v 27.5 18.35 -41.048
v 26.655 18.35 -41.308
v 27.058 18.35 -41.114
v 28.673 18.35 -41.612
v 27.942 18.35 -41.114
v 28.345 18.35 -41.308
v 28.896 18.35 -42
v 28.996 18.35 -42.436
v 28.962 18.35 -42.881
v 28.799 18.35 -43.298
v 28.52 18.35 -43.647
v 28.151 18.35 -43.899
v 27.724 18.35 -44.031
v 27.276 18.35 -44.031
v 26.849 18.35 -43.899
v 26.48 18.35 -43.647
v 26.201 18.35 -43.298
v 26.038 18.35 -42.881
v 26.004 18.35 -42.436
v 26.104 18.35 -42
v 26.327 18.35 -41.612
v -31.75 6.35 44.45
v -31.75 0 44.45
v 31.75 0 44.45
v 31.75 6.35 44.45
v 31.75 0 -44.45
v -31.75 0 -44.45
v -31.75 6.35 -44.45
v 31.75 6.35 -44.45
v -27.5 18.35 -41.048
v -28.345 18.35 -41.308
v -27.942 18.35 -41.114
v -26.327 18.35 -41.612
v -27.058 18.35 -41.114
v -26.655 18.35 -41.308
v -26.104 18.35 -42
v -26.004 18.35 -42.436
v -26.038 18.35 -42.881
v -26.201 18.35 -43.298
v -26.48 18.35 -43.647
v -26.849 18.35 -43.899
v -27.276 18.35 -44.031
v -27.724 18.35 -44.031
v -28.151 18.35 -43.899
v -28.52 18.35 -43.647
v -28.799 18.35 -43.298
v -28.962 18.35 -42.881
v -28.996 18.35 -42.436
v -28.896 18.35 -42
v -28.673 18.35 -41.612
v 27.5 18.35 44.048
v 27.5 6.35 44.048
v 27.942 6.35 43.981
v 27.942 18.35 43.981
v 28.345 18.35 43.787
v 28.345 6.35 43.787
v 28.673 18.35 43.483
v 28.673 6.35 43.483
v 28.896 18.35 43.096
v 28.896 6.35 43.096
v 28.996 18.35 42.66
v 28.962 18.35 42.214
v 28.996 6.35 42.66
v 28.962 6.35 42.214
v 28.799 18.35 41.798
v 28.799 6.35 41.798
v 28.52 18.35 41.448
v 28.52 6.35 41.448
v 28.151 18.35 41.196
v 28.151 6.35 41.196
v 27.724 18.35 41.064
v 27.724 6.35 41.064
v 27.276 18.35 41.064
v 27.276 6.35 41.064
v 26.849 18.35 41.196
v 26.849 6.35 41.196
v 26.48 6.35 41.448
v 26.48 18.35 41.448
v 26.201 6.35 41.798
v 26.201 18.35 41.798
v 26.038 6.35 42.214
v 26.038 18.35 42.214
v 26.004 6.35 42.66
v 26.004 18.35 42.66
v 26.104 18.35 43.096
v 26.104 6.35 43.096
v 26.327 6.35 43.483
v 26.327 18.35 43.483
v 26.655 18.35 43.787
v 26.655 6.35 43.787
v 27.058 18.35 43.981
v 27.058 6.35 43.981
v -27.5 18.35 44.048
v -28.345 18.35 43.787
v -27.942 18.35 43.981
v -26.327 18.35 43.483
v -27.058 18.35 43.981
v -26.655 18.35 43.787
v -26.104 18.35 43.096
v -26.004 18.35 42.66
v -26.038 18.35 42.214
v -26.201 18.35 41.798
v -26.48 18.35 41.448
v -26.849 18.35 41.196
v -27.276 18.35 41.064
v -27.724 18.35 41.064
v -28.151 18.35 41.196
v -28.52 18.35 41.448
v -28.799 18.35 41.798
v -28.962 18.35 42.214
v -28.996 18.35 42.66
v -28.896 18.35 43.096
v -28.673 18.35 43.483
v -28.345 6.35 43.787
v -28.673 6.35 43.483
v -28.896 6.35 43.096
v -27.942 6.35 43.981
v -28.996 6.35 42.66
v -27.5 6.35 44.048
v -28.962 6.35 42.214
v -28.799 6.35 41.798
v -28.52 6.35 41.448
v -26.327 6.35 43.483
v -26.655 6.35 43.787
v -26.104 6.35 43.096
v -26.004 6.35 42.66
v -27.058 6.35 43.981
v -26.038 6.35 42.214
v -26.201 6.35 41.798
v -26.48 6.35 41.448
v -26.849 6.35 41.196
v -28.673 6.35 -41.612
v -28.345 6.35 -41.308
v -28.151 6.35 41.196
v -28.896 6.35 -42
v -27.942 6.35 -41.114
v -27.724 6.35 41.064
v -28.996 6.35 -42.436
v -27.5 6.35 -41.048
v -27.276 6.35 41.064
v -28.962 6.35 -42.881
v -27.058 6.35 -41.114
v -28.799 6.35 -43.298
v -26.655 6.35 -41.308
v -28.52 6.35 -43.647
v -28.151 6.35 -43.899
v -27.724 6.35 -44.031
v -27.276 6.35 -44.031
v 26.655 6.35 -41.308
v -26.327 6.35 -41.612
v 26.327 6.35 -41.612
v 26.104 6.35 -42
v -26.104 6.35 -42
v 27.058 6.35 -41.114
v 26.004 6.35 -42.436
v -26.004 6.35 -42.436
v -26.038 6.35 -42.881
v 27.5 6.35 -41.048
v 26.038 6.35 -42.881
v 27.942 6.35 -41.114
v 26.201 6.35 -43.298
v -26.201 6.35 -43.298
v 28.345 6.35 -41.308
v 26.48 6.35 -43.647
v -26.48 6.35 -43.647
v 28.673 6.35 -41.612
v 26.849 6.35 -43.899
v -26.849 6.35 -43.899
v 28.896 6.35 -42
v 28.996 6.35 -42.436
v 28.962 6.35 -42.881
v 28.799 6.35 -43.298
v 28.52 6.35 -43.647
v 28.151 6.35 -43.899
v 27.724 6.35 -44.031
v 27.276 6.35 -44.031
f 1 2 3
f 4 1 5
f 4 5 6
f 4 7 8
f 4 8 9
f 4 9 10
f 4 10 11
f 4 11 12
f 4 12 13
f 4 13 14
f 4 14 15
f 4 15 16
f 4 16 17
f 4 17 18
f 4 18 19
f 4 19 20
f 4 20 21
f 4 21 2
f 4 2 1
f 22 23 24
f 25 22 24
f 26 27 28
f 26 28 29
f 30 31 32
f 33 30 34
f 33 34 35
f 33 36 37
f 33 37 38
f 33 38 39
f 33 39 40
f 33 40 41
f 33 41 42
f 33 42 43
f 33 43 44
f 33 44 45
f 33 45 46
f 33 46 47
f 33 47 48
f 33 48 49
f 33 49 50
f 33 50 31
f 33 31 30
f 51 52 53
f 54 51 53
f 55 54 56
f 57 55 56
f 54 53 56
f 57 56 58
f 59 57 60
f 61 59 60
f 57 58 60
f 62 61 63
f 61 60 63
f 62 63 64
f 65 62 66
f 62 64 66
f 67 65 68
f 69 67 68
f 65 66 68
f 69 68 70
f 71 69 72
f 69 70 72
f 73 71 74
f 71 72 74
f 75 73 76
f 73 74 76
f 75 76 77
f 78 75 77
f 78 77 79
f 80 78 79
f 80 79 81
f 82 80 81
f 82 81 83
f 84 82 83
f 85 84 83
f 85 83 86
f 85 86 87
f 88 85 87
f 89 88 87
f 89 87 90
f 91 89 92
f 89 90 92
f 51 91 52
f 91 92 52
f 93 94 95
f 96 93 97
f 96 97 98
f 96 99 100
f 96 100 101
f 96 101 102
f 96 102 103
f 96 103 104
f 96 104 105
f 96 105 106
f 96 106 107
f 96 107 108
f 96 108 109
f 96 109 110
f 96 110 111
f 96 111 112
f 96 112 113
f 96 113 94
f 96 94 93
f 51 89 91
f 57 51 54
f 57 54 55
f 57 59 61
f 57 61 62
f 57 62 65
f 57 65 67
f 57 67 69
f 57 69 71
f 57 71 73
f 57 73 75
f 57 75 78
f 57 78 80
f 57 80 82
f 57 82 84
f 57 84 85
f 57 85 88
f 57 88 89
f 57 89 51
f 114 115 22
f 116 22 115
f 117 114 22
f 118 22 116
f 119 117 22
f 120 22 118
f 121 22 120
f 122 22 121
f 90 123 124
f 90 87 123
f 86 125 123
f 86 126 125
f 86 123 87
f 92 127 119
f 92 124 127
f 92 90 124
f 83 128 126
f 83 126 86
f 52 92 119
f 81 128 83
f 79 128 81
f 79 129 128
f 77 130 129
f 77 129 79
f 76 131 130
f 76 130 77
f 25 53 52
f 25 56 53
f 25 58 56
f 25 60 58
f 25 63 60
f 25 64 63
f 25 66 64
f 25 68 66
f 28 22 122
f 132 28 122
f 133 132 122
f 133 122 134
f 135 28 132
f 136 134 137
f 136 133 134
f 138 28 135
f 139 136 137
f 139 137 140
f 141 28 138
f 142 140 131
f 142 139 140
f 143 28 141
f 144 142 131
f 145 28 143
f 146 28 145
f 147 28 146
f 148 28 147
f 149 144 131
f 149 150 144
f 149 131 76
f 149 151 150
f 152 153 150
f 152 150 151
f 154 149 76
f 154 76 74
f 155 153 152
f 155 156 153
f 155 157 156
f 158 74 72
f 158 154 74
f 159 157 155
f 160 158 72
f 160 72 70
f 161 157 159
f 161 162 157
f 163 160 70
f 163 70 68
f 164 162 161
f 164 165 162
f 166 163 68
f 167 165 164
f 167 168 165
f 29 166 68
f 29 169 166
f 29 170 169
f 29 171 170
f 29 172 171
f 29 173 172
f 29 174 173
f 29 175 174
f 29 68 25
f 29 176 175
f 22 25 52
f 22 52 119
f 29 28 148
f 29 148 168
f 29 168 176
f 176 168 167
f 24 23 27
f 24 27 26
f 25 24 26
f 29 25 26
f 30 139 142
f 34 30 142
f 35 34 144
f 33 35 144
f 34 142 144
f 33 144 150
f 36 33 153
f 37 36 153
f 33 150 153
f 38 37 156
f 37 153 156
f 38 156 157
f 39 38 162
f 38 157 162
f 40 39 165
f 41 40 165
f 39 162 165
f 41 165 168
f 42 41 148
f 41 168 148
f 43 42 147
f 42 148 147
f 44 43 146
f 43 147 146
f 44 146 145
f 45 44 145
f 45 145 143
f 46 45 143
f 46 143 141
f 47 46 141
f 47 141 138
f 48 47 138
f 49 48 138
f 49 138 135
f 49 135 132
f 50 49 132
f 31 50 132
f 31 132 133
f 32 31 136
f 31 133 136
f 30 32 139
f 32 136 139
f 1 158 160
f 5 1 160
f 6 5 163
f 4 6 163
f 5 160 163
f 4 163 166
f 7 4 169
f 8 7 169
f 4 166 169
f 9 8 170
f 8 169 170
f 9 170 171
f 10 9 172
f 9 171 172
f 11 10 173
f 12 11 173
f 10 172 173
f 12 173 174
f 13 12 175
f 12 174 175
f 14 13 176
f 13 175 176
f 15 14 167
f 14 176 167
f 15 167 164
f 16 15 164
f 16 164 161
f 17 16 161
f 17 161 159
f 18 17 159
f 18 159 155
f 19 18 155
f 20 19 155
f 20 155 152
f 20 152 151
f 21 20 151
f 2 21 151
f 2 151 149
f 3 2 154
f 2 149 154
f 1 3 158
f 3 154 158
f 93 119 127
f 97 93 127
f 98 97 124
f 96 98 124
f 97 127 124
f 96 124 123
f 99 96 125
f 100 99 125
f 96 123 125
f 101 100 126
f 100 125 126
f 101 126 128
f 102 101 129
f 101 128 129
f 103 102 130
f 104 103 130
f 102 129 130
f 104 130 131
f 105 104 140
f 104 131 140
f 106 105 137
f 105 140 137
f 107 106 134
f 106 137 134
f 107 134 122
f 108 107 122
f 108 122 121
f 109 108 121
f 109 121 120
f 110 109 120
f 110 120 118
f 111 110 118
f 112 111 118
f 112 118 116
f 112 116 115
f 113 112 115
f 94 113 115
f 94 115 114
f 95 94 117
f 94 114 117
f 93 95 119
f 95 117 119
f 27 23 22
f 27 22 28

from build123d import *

# Parameters (mm, degrees)
SKETCH1_W           = 63.5
SKETCH1_H           = 88.9
BOSS_EXTRUDE1_DEPTH = 6.35
SKETCH2_R           = 1.5
BOSS_EXTRUDE2_DEPTH = 12


with BuildPart() as part:
    # Sketch1 → Boss-Extrude1 (new body)
    with BuildSketch(Plane(origin=(0, 0, 0), x_dir=(1, 0, 0), z_dir=(0, 1, 0))):
        Rectangle(SKETCH1_W, SKETCH1_H)
    extrude(amount=BOSS_EXTRUDE1_DEPTH)

    # Sketch2 → Boss-Extrude2 (add)
    with BuildSketch(Plane(origin=(0, 6.35, 0), x_dir=(1, 0, 0), z_dir=(0, 1, 0))):
        with Locations(Location((-27.5, 42.547666838, 0), (0, 0, 270))):
            Circle(SKETCH2_R)
        with Locations(Location((27.5, 42.547666838, 0), (0, 0, 270))):
            Circle(SKETCH2_R)
        with Locations(Location((27.5, -42.547666838, 0), (0, 0, 270))):
            Circle(SKETCH2_R)
        with Locations(Location((-27.5, -42.547666838, 0), (0, 0, 270))):
            Circle(SKETCH2_R)
    extrude(amount=BOSS_EXTRUDE2_DEPTH)


solid = part.part
